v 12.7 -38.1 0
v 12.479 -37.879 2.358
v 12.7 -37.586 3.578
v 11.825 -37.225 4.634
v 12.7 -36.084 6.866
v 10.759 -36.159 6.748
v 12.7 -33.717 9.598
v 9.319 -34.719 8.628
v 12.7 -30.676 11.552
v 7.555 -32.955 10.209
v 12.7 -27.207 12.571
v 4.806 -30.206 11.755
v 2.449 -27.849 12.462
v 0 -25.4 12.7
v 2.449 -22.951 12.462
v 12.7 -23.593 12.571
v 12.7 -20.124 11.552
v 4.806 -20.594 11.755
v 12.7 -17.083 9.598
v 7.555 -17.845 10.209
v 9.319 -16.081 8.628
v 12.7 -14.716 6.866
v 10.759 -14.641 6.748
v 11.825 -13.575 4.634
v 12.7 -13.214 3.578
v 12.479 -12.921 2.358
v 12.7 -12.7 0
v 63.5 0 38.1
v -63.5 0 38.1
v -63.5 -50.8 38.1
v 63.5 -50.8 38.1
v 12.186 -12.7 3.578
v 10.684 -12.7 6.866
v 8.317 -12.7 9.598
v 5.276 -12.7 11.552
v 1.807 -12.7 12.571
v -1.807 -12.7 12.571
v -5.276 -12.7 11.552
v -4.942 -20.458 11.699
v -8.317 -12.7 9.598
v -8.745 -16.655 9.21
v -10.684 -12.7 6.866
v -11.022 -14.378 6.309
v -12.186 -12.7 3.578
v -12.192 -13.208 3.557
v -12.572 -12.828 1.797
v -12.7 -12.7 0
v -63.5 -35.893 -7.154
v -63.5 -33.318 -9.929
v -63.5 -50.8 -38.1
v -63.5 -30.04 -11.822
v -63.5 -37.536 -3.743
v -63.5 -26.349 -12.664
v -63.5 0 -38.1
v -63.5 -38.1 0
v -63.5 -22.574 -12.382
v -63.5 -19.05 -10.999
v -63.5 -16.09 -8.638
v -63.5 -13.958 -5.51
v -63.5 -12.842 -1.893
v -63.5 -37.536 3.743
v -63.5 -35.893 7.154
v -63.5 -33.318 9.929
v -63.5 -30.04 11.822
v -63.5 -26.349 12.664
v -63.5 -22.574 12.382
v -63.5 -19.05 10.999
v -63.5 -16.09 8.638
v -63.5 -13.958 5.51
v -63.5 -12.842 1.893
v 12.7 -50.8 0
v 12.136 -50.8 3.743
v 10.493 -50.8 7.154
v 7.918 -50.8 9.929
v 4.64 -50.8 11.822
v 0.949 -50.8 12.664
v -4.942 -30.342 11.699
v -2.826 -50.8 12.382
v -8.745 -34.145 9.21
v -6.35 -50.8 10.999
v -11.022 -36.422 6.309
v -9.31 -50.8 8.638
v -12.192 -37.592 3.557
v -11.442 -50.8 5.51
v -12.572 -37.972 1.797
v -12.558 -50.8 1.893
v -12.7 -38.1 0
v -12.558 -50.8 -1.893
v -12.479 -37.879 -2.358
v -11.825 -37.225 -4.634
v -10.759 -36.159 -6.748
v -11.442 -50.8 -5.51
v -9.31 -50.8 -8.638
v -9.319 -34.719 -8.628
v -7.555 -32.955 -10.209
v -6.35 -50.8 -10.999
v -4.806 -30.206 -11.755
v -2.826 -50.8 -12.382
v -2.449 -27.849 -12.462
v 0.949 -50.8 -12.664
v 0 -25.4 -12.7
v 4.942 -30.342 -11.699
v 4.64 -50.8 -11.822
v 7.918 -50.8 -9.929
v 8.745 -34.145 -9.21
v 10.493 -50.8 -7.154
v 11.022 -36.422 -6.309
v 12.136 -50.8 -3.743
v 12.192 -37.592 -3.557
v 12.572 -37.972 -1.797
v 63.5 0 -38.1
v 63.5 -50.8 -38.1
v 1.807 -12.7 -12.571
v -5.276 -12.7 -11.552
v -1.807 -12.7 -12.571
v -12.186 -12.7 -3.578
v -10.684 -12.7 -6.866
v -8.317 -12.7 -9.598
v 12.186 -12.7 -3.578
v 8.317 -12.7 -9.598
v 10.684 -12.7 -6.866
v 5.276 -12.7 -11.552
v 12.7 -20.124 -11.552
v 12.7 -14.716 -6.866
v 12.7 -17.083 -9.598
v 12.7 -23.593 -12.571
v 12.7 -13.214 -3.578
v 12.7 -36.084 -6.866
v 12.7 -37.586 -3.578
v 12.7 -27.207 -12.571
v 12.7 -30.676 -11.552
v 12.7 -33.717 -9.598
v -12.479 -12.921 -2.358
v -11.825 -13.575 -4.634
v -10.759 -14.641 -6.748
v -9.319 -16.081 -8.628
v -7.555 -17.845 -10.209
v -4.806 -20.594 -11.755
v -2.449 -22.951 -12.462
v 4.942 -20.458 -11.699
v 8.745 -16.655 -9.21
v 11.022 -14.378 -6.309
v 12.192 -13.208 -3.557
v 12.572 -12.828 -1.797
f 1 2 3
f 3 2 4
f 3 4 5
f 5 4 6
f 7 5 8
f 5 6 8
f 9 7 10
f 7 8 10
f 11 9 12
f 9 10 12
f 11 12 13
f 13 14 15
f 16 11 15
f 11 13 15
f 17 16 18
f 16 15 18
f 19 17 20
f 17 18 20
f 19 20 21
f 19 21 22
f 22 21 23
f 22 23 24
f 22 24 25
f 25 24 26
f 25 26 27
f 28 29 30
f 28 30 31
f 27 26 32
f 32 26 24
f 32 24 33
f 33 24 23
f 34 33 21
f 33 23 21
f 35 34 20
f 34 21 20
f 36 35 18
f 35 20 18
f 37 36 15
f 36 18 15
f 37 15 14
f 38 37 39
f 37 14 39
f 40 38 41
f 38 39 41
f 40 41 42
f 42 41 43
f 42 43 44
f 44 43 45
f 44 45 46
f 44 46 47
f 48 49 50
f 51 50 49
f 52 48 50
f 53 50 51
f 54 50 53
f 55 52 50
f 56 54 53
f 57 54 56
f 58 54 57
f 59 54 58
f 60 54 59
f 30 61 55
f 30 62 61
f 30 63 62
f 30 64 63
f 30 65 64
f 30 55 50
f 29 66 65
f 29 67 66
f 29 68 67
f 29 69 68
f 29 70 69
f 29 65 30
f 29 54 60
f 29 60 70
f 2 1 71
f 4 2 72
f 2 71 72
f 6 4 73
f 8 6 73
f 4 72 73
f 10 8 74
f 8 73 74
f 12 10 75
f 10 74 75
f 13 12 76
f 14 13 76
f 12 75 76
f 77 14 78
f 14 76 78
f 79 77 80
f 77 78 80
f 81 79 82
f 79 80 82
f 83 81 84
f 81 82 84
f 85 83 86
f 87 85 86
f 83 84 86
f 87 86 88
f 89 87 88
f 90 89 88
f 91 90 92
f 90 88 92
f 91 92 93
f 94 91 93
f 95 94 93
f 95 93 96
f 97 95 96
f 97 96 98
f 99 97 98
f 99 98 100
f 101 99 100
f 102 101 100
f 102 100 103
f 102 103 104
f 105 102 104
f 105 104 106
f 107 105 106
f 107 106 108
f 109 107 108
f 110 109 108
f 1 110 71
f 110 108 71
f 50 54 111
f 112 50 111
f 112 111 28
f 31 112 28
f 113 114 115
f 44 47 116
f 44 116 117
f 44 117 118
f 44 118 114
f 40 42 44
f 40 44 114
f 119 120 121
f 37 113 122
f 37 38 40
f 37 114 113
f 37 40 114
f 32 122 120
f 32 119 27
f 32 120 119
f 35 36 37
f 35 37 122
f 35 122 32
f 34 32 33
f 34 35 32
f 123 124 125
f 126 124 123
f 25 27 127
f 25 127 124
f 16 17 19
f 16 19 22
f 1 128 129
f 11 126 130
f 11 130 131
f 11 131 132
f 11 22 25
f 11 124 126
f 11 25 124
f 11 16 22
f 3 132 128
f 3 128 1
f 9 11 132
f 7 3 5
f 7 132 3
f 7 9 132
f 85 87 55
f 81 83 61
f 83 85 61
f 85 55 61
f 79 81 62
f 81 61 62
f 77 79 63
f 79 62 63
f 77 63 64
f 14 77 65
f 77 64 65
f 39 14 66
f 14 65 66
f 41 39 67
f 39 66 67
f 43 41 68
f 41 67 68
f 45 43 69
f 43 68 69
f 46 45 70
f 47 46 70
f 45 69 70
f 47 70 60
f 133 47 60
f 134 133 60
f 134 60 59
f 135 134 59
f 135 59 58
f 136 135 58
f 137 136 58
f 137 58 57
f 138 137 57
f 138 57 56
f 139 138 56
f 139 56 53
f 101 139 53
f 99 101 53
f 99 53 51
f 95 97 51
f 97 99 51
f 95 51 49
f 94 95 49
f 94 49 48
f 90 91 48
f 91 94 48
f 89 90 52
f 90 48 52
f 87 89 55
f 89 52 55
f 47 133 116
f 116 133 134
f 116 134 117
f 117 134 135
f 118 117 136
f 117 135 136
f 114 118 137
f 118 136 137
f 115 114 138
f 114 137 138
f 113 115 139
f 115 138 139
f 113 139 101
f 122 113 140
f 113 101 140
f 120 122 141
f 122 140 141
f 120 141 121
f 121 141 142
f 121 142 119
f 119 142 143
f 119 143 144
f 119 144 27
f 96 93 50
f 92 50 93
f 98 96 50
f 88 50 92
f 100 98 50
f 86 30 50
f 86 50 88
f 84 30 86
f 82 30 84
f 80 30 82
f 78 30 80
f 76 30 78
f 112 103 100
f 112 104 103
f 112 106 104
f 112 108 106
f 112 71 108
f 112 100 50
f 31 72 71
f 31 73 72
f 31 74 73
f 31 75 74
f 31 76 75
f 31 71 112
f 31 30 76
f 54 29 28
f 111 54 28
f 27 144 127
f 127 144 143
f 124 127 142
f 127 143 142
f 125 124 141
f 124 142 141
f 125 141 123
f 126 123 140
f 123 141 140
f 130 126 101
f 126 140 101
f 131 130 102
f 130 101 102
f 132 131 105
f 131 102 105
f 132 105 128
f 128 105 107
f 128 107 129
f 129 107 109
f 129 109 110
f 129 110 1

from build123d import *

# Parameters (mm, degrees)
F0_W     = 127
F0_H     = 76.2
F1_DEPTH = 50.8
F2_R     = 12.7
F3_DEPTH = 38.1
F4_R     = 12.7
F5_DEPTH = 76.2


with BuildPart() as f1:
    # F0 (on Front) → F1 (new body)
    with BuildSketch(Plane.XZ):
        Rectangle(F0_W, F0_H)
    extrude(amount=F1_DEPTH)

    # F2 (on face) → F3 (cut)
    with BuildSketch(Plane.XZ.offset(50.8)):
        Circle(F2_R)
    extrude(amount=-F3_DEPTH, mode=Mode.SUBTRACT)

    # F4 (on face) → F5 (cut)
    with BuildSketch(Plane(origin=(-63.5, 0, 0), x_dir=(0, -1, 0), z_dir=(-1, 0, 0))):
        with Locations((25.4, 0)):
            Circle(F4_R)
    extrude(amount=-F5_DEPTH, mode=Mode.SUBTRACT)


solid = f1.part
